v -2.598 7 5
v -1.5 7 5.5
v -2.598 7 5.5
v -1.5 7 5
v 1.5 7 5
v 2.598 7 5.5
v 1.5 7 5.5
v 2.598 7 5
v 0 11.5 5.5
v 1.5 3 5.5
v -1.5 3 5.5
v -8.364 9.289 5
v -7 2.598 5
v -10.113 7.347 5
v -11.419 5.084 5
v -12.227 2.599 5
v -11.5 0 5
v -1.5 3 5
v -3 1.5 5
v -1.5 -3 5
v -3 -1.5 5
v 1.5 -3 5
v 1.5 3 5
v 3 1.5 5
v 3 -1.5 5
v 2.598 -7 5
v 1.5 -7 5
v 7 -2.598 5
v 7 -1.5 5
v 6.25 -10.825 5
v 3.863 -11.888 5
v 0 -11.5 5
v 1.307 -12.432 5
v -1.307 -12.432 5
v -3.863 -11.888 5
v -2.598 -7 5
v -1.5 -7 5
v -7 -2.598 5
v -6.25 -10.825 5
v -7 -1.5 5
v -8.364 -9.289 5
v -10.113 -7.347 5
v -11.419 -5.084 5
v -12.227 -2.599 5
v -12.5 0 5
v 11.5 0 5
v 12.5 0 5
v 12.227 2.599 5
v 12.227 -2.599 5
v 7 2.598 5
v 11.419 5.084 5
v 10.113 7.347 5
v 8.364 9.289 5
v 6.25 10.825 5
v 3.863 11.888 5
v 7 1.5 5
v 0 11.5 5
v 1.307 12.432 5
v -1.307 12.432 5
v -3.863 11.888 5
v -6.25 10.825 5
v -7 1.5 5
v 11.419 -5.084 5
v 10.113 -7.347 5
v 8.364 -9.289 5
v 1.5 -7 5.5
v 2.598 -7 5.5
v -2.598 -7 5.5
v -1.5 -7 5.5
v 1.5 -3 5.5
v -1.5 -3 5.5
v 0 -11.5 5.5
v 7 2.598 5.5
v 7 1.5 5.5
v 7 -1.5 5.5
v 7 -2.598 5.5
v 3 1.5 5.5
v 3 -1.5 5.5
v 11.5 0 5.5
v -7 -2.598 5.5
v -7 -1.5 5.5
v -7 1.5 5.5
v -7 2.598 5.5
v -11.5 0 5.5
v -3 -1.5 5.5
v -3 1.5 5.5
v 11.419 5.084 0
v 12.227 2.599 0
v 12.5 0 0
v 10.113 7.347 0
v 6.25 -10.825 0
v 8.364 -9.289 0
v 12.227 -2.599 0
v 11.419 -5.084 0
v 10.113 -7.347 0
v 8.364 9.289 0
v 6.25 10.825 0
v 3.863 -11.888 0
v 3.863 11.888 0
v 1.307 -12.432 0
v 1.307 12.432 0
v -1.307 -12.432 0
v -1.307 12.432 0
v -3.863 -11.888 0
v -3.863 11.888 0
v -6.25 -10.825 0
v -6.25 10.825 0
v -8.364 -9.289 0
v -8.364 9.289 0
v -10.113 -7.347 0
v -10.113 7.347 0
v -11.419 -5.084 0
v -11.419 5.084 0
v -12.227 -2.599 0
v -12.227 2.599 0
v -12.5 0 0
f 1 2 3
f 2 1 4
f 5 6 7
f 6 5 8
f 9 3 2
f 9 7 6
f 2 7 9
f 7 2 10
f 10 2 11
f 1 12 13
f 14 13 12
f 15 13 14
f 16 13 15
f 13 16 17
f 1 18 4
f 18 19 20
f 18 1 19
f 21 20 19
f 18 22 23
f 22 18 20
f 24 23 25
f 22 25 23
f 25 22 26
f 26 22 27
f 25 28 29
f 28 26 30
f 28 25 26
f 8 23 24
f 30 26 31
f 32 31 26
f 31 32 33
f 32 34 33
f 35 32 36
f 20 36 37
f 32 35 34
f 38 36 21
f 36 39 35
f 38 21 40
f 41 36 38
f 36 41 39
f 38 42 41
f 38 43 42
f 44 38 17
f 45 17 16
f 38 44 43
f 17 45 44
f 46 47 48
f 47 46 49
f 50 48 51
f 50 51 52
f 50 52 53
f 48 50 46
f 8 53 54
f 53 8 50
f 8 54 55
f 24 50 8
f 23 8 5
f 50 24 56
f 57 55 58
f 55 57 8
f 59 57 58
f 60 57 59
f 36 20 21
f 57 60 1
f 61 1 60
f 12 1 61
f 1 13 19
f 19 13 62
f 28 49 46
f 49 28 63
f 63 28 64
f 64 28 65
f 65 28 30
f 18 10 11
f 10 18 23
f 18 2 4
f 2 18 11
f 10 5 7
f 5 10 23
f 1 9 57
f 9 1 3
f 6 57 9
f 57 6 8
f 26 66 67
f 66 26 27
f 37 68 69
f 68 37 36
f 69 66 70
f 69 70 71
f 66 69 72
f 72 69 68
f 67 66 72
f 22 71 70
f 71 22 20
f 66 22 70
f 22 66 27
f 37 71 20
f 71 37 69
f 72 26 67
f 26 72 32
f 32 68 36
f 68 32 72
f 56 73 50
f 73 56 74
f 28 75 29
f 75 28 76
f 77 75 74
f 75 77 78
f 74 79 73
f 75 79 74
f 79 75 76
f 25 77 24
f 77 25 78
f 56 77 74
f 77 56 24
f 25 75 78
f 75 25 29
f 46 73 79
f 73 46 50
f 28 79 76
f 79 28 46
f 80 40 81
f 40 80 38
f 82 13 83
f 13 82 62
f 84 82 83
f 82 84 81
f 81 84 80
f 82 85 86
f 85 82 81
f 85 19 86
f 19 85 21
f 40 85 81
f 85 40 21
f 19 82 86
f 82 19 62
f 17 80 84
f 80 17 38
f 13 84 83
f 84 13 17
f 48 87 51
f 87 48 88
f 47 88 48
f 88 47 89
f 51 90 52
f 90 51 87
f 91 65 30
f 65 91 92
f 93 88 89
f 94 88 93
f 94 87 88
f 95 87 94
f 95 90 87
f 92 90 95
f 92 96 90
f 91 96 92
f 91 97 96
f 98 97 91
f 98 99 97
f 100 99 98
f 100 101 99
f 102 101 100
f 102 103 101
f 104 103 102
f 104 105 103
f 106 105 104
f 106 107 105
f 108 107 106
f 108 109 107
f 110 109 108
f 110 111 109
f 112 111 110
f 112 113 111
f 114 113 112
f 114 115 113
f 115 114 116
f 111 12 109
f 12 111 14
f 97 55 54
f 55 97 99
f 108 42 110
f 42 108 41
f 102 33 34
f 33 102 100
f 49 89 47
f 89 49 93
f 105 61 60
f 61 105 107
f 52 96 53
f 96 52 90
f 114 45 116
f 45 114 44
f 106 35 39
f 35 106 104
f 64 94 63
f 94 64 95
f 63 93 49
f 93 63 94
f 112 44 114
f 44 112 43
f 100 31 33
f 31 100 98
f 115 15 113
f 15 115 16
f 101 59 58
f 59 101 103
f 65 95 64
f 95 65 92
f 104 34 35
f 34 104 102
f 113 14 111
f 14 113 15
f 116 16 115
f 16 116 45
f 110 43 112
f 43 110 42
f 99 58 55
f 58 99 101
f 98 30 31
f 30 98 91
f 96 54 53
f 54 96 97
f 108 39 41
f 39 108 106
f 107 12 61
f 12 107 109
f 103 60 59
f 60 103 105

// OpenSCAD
// file: common.scad
module arrow() {
    union() {
        translate([-3,-1.5,0]) cube([4,3,0.5]);
        translate([2.5,0,0]) cylinder(0.5,3,3,$fn=3);
    }
}
// main file
include <common.scad>;

color([0,0.75,1]) cylinder(5,12.5,12.5,false);

color([1,1,1]) translate([0,6,5]) rotate(90) arrow();
color([1,1,1]) translate([0,-6,5]) rotate(270) arrow();
color([1,1,1]) translate([6,0,5]) arrow();
color([1,1,1]) translate([-6,0,5]) rotate(180) arrow();
